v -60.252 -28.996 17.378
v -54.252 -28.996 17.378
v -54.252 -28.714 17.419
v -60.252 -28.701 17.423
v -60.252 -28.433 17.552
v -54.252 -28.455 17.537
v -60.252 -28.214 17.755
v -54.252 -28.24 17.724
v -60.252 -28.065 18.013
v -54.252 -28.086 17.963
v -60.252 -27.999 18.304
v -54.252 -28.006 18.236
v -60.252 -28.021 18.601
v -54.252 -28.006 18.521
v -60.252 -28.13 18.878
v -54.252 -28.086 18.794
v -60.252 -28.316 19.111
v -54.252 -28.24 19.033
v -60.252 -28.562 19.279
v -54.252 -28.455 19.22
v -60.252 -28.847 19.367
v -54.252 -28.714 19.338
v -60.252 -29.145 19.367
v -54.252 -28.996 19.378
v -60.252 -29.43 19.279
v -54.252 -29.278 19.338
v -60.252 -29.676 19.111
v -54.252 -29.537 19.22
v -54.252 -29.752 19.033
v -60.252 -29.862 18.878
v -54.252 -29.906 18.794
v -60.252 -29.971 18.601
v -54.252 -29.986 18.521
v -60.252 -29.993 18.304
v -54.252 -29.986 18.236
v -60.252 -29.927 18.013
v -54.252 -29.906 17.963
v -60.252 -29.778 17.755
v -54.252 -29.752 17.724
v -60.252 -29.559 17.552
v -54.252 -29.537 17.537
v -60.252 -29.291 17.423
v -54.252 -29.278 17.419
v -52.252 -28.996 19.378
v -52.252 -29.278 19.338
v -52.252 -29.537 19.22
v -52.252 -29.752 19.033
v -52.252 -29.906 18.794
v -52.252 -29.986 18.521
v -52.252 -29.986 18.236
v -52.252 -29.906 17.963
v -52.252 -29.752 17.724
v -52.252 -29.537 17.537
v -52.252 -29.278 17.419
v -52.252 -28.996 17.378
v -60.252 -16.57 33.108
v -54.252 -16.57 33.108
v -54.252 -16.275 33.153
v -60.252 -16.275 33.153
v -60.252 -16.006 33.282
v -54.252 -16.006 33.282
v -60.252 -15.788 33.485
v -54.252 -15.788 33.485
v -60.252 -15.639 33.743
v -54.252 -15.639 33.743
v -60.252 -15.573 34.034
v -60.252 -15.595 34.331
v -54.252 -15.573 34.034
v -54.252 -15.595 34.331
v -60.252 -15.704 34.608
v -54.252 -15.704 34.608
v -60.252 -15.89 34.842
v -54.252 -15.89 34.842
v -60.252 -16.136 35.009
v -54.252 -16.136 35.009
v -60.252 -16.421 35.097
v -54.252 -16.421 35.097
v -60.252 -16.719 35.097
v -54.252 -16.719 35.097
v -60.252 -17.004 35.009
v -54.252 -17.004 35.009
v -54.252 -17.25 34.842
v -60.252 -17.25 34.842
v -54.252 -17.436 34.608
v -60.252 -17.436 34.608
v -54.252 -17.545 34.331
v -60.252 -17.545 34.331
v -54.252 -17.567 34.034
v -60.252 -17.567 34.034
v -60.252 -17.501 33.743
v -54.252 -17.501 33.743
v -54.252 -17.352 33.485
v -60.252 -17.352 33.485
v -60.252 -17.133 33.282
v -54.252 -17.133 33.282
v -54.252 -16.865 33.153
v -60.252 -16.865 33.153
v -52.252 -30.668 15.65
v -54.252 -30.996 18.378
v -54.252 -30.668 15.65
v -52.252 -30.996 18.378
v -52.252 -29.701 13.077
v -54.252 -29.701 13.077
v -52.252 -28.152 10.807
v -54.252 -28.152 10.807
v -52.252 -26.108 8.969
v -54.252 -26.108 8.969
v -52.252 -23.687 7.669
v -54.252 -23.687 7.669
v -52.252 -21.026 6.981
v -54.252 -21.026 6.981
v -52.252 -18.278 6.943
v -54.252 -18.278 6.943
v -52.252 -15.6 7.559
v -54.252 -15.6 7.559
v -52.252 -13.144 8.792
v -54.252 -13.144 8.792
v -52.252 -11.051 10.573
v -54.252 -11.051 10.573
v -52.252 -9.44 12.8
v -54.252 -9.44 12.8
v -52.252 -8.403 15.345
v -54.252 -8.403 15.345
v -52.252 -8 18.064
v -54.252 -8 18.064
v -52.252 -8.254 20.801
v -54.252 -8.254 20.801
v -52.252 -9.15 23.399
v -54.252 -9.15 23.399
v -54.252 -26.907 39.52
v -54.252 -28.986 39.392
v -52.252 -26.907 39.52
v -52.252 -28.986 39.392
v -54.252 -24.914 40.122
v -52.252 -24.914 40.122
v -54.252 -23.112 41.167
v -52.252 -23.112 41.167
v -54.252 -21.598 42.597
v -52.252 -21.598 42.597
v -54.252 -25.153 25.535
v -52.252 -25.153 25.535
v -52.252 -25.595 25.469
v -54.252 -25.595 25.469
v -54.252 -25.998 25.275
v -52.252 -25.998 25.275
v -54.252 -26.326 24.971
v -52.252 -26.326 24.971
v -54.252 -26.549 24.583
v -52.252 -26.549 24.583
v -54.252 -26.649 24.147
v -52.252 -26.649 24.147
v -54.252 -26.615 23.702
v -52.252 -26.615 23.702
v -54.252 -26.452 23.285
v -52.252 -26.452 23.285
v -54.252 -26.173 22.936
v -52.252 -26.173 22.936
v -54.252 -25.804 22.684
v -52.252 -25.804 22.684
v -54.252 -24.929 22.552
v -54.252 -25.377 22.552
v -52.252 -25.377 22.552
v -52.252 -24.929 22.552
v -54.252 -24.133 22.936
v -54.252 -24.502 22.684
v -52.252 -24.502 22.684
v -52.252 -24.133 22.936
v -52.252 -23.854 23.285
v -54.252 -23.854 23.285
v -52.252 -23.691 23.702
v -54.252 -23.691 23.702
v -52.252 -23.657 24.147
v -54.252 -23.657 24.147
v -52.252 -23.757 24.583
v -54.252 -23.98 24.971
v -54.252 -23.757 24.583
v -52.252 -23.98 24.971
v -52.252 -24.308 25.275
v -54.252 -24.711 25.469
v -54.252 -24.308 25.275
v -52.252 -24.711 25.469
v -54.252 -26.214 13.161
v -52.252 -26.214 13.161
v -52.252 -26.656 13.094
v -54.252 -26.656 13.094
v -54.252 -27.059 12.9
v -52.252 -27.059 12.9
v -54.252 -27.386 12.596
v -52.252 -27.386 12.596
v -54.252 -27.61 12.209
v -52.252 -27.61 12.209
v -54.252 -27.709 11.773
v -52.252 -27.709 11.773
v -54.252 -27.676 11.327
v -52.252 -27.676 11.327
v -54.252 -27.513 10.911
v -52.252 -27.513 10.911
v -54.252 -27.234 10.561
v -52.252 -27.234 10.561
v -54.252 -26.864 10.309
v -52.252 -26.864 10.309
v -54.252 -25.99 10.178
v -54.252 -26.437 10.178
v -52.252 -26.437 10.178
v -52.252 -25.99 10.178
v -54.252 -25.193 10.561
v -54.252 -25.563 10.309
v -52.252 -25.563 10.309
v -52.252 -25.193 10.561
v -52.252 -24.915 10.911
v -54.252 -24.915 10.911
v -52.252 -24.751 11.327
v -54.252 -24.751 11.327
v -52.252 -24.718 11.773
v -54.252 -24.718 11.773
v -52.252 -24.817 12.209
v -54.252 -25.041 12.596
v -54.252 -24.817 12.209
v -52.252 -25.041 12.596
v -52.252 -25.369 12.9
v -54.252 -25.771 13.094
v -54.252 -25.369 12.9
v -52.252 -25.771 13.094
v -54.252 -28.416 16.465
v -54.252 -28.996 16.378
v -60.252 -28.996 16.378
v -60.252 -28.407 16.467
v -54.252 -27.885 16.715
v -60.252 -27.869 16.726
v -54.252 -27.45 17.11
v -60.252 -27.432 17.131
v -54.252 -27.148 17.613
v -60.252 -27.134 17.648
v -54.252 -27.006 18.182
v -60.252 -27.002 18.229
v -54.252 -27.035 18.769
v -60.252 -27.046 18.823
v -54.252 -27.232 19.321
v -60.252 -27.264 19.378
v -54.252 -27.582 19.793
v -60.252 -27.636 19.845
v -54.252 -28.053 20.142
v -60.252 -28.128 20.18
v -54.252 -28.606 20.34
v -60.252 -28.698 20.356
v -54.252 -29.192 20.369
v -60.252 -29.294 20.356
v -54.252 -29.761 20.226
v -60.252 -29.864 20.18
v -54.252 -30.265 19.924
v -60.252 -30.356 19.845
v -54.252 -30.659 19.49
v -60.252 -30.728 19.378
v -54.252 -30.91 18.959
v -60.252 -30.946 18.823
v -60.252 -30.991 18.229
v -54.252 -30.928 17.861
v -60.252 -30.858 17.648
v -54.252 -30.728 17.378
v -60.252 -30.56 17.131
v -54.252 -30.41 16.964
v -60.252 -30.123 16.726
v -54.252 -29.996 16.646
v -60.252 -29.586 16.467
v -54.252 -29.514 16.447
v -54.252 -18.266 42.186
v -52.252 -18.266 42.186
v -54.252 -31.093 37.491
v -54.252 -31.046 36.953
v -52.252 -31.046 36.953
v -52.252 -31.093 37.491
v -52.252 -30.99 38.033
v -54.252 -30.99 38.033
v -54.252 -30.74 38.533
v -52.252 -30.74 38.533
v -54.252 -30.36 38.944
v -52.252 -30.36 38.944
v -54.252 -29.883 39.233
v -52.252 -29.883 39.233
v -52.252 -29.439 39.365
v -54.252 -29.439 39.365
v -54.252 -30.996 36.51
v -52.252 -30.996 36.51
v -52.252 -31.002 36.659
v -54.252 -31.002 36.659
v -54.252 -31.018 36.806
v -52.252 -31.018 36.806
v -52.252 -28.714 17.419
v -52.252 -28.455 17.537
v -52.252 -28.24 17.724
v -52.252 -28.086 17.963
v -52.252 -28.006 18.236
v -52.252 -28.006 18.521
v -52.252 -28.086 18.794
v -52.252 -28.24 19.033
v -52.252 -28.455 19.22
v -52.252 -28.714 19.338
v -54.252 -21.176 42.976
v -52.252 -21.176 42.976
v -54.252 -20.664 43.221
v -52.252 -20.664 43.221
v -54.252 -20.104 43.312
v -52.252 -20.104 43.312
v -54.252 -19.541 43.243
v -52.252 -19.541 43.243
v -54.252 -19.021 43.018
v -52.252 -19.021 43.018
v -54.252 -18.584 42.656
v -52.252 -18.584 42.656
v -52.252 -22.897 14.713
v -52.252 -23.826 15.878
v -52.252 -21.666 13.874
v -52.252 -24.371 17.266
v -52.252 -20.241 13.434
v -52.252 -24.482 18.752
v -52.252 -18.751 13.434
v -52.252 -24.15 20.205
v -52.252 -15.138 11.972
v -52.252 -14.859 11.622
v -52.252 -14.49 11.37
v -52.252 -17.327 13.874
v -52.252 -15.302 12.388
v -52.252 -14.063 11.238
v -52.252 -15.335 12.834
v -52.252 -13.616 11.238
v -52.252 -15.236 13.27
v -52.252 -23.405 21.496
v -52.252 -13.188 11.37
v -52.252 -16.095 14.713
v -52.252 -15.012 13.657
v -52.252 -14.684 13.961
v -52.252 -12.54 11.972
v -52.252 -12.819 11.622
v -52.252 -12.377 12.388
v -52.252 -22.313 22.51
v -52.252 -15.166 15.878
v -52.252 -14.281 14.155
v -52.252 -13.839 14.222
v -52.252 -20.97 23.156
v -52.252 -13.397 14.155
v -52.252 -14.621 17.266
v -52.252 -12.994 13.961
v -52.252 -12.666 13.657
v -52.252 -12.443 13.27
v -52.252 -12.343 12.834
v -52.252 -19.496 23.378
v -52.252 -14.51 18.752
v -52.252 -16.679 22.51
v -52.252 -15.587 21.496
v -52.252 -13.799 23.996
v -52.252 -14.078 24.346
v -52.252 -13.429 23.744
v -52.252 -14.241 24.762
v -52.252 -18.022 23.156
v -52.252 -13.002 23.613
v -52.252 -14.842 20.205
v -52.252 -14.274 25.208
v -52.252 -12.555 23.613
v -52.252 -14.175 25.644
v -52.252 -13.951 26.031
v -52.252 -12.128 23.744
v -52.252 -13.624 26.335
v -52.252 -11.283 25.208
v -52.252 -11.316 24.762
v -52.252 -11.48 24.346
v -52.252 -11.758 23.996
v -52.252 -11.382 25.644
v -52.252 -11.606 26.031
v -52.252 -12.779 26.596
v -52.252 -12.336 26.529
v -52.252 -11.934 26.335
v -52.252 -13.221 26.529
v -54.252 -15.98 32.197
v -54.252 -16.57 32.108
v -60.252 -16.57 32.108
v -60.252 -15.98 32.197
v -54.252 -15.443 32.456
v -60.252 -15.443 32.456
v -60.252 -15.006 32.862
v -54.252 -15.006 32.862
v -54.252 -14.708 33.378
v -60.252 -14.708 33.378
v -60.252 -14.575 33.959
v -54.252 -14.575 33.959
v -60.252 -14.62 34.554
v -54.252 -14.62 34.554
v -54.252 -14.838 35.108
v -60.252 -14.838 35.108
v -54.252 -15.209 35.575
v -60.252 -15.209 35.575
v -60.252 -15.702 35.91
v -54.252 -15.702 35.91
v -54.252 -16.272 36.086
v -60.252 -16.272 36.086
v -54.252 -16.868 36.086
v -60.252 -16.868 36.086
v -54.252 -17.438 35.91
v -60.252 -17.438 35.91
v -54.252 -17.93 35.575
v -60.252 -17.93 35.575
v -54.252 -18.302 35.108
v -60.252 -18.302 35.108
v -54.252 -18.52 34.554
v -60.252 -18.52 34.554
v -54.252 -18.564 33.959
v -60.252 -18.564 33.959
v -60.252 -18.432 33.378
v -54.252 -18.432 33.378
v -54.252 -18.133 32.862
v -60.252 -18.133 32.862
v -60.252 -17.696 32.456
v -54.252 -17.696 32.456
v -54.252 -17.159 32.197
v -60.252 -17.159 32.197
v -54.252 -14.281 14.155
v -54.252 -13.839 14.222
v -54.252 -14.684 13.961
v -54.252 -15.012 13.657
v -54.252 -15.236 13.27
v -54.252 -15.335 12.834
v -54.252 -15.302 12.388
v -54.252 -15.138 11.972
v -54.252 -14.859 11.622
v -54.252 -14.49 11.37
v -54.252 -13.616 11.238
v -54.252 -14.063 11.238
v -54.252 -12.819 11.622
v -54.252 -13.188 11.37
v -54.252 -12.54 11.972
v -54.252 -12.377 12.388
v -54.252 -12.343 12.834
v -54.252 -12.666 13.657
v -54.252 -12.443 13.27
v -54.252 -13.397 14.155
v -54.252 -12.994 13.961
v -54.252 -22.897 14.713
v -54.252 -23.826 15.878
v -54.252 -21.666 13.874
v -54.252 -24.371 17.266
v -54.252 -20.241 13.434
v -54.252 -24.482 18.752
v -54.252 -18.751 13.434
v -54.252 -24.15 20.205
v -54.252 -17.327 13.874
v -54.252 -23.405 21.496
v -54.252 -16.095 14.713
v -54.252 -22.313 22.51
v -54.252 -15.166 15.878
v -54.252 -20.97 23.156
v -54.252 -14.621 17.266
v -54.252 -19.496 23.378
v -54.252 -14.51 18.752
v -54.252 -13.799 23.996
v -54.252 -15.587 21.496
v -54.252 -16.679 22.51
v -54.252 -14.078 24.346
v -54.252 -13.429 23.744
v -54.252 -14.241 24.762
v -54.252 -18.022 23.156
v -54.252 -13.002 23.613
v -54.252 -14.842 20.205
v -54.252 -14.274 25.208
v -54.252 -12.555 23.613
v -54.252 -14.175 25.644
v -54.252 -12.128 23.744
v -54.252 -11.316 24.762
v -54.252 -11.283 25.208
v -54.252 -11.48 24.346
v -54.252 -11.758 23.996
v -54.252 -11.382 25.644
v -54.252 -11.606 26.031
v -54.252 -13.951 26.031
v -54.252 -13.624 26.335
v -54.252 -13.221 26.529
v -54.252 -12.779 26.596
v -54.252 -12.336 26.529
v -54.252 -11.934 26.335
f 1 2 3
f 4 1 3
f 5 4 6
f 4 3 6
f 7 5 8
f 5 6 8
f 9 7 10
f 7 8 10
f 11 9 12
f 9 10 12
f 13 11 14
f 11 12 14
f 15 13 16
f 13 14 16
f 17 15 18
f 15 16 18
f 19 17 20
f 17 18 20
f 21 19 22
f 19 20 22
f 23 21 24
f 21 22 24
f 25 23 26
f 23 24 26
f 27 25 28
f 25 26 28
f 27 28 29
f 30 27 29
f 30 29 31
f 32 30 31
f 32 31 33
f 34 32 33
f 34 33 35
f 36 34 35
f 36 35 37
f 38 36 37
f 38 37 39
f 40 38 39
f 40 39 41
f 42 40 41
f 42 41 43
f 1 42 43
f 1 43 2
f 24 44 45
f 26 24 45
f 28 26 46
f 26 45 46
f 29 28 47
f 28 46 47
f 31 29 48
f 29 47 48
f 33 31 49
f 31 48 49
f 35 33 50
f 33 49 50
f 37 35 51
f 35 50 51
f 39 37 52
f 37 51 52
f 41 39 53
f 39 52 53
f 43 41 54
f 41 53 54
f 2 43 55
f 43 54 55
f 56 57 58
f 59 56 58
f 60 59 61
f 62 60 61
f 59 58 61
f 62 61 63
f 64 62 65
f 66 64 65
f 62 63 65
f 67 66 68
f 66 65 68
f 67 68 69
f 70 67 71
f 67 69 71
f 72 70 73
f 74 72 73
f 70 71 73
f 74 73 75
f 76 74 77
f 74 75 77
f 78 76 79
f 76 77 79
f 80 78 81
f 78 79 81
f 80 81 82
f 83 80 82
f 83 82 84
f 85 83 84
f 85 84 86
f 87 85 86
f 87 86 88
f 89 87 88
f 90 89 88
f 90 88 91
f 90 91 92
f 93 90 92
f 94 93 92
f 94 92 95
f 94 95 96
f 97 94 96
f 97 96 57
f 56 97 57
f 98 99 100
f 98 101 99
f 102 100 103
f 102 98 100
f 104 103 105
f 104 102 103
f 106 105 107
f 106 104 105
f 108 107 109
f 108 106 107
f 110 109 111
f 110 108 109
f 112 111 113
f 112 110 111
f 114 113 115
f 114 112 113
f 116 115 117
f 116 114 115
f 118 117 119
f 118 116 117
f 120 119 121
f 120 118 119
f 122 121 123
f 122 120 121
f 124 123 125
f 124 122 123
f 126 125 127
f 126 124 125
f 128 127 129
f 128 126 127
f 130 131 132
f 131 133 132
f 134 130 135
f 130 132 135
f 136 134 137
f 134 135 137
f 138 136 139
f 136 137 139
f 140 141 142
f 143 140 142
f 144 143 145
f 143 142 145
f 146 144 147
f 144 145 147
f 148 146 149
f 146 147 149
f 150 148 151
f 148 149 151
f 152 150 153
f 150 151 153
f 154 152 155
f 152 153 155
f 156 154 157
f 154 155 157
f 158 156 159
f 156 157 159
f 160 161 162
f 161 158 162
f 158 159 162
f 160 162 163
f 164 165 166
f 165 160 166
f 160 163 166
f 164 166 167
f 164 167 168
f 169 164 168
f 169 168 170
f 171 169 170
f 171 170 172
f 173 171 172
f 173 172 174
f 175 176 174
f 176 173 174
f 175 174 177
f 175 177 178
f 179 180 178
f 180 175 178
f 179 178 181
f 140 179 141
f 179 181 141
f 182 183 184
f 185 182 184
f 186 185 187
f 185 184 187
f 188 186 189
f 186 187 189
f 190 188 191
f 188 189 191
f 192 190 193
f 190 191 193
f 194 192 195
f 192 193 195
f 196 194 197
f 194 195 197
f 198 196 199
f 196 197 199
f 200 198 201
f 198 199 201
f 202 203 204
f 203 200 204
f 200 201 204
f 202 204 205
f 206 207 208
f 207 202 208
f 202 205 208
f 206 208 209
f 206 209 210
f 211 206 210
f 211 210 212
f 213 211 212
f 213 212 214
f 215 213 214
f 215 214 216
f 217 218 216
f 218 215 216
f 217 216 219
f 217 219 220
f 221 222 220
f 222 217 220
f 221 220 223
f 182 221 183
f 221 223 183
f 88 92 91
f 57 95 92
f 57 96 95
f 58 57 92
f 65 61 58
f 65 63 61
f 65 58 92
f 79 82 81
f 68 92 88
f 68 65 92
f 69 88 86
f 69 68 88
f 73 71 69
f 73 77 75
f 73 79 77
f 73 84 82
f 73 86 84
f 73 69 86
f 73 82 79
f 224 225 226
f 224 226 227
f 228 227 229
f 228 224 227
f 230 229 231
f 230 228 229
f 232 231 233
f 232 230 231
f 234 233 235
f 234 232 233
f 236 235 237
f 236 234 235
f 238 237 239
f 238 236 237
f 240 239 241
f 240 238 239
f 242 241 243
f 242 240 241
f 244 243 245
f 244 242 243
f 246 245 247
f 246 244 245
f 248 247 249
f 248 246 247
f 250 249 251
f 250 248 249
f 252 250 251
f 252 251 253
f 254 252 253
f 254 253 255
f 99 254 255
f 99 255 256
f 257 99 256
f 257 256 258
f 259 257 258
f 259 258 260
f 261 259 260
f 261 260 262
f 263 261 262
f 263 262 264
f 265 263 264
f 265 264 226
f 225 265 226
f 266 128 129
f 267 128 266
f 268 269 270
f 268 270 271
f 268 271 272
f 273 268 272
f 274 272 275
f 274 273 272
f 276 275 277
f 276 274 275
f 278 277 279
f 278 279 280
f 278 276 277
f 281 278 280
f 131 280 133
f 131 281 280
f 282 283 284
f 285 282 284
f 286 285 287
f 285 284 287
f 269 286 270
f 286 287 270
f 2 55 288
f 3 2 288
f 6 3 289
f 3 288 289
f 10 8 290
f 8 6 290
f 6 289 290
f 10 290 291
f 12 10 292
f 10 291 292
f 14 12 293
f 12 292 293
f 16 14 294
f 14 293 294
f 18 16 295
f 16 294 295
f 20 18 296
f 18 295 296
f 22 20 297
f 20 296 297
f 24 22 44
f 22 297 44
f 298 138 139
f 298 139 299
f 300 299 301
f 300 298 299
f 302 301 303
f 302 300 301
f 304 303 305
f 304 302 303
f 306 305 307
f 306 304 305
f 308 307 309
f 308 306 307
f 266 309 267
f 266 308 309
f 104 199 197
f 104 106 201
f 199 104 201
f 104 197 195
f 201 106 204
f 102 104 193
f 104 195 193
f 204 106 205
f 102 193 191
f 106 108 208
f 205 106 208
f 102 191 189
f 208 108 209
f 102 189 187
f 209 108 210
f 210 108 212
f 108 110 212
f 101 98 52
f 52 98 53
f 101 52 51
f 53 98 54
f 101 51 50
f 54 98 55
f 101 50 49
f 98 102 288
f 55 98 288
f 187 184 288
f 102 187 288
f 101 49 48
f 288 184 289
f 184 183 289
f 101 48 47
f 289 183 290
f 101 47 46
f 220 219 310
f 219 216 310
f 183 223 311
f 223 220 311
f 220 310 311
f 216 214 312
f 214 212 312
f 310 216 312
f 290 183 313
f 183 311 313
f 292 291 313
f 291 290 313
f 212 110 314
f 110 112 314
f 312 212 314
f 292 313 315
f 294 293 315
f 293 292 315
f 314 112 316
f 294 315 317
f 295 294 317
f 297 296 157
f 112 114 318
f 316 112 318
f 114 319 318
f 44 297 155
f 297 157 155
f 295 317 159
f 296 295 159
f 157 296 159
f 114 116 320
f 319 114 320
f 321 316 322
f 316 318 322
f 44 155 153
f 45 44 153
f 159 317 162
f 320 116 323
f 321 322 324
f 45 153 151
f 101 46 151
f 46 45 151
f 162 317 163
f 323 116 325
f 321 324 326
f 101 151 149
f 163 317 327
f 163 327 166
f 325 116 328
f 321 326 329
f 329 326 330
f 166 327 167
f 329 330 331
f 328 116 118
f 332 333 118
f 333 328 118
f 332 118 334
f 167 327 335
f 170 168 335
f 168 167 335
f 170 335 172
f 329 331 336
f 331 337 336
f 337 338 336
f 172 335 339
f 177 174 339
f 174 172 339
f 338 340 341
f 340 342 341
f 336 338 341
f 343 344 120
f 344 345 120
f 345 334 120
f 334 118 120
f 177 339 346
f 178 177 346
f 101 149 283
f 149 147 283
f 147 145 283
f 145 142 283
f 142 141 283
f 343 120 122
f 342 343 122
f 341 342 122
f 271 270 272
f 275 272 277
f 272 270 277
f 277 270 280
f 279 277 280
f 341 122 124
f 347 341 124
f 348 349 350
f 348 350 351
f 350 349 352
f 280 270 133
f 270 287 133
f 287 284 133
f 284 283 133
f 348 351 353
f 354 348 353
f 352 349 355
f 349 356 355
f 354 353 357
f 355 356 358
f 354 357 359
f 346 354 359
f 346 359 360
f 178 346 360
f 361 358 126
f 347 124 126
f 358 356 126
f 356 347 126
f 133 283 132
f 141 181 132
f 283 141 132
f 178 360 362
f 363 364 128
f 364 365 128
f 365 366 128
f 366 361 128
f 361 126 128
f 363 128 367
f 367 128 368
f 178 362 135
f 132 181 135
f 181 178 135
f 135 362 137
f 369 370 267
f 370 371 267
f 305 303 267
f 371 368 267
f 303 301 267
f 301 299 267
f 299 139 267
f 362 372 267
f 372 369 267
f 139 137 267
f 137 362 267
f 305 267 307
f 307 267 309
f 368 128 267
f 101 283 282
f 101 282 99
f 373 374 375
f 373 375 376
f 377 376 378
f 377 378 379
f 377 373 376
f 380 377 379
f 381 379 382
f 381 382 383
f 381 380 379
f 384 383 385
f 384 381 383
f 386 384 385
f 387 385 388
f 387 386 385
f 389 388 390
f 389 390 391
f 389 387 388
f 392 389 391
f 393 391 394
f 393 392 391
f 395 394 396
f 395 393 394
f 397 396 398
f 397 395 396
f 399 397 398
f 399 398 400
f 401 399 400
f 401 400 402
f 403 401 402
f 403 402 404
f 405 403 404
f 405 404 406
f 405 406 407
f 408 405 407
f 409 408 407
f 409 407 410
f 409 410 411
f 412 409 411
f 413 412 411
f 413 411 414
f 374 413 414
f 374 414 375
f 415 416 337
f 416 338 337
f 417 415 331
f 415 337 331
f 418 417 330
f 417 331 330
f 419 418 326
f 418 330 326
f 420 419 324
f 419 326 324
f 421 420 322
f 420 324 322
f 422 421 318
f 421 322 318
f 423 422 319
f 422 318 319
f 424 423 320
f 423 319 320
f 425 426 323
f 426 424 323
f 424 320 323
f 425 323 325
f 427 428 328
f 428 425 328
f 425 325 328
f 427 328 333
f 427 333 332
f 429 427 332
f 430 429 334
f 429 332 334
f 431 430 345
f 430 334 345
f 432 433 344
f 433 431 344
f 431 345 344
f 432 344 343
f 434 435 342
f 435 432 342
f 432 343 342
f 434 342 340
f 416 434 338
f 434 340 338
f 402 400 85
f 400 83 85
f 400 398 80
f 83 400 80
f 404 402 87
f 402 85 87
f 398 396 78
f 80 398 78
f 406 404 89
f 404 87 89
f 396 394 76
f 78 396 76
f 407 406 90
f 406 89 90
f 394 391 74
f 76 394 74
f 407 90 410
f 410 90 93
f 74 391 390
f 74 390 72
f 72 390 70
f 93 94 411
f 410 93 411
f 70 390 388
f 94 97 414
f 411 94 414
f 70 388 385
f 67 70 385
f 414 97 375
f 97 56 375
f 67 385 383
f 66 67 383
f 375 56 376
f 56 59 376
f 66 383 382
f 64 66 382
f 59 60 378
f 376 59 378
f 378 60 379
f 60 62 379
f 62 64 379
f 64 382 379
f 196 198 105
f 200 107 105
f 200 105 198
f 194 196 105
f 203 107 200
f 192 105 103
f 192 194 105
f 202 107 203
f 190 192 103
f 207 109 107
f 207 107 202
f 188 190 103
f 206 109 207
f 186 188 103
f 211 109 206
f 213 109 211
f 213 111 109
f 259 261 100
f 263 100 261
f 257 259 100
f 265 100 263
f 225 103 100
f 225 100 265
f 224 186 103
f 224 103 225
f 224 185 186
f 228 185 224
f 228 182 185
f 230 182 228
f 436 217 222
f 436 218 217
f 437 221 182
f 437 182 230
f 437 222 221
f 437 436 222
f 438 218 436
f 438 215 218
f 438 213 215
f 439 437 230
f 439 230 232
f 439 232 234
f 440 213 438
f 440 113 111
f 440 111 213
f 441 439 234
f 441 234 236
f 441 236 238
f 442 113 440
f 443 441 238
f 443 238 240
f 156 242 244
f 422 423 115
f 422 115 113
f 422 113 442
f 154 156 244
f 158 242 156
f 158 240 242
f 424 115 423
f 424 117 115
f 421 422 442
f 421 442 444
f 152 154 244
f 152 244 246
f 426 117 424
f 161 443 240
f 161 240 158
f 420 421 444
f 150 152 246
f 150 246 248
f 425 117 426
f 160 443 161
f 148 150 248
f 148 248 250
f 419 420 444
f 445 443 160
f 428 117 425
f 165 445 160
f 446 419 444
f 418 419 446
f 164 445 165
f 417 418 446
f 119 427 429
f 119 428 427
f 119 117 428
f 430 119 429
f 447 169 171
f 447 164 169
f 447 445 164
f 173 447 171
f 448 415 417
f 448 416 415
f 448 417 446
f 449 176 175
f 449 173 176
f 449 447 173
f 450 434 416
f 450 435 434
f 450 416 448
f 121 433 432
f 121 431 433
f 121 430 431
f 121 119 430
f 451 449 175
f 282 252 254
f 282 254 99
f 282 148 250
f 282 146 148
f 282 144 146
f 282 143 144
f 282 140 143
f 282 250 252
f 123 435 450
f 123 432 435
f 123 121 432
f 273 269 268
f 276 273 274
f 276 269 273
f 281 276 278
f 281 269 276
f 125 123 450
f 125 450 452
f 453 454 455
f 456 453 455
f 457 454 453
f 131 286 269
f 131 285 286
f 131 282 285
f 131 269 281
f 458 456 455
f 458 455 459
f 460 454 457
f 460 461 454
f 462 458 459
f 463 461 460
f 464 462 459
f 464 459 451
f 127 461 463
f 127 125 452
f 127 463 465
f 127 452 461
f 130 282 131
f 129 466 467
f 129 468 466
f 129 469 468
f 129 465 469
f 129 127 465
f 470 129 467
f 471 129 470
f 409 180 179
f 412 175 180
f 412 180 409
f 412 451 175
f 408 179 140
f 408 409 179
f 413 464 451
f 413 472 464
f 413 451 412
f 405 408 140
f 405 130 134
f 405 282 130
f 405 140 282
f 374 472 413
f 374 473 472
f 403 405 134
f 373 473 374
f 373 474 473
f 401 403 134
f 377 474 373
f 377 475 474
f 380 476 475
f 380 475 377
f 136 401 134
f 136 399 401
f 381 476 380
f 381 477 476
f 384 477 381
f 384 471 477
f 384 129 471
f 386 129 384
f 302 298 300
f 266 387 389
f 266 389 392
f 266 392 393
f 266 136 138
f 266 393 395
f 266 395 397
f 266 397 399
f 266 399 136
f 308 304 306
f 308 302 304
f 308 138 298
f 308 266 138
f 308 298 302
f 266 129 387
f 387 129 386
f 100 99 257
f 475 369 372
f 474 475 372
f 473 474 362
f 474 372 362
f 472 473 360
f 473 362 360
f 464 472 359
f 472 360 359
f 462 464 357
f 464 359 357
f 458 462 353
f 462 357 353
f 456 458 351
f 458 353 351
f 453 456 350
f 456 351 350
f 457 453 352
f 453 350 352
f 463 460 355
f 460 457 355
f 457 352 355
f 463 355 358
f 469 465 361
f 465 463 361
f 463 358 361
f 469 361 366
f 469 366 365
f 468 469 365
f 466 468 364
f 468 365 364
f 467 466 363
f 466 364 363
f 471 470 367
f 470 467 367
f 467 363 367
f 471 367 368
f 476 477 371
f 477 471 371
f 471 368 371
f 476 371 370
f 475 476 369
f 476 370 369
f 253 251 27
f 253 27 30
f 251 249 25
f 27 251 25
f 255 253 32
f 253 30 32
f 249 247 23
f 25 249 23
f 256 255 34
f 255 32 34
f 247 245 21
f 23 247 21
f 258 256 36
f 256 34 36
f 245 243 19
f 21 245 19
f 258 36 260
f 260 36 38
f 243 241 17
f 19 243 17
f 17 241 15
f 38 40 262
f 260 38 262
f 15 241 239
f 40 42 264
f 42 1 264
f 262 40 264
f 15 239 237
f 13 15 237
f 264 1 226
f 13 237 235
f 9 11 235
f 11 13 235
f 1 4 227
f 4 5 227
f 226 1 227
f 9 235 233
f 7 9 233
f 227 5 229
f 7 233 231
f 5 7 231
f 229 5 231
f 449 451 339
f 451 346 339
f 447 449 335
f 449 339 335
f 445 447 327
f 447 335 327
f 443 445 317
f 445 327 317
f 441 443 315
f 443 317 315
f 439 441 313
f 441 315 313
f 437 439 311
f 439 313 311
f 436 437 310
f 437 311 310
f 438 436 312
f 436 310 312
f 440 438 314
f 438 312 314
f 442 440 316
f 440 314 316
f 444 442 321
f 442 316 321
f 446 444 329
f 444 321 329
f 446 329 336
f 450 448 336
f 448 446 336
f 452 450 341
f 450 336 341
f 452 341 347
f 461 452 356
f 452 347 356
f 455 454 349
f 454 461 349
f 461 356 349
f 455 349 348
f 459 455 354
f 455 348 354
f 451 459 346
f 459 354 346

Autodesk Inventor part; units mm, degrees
ref_plane "YZ Plane" through (0, 0, 0) normal (1, 0, 0) x (0, 1, 0)
ref_plane "XZ Plane" through (0, 0, 0) normal (0, 1, 0) x (-1, 0, 0)
ref_plane "XY Plane" through (0, 0, 0) normal (0, 0, 1) x (1, 0, 0)
ref_plane "作業平面1" through (-52.2521, -19.4961, 18.3784) normal (-1, 0, 0) x (0, 0, 1)
sketch "スケッチ1" plane through (-52.2521, -19.4961, 18.3784) normal (-1, 0, 0) x (0, 0, 1)
  line L0 (27.6413, -15.0569) -> (18.8577, -11.6363) projected
  arc A0 (27.6413, -15.0569) -> (32.8377, -3.1521) centre (30, -9) ccw projected
  line L1 (5.0205, 10.3462) -> (32.8377, -3.1521) projected
  arc A1 (5.0205, 10.3462) -> (0, -11.5) centre (0, 0) ccw projected
  line L2 (18.1319, -11.5) -> (0, -11.5) projected
  arc A2 (18.8577, -11.6363) -> (18.1319, -11.5) centre (18.1319, -13.5) ccw projected
  circle A3 centre (0, 0) radius 1.75 projected
  circle A4 centre (30, -9) radius 3.6 projected
  arc A5 (27.2373, -0.4345) -> (21.8406, -12.798) centre (30, -9) ccw
  circle A6 centre (6.7175, 6.7175) radius 1.6 projected
  circle A7 centre (-5.6569, 5.6569) radius 1.6 projected
  circle A8 centre (-6.7175, -6.7175) radius 1.6 projected
  circle A9 centre (5.6569, -5.6569) radius 1.6 projected
  circle A10 centre (15.7301, 2.9263) radius 2
  circle A11 centre (-5.6569, 5.6569) radius 1.5
  circle A12 centre (6.7175, 6.7175) radius 1.5
  circle A13 centre (5.6569, -5.6569) radius 1.5
  circle A14 centre (-6.7175, -6.7175) radius 1.5
  circle A15 centre (0, 0) radius 5
  circle A16 centre (0, -9.5) radius 1
  circle A17 centre (0, -9.5) radius 2
  line L3 (0, 0) -> (0, -11.5) construction
  circle A18 centre (15.7301, 2.9263) radius 1 projected
  circle A19 centre (0, -9.5) radius 1 projected
  point P0 (-18.3784, 19.4961)
  dimension "d0" = 9
  dimension "d4" = 4
  dimension "d8" = 3
  dimension "d9" = 10
  dimension "d10" = 4
  dimension "d11" = 2
extrude "押し出し1" add sketch "スケッチ1" along normal blind 2 contours A10 | A17 | L0 A2 L2 A1 L1 A5 | A6 | A7 | A8 | A9 | A18
fillet "フィレット1" radius 2 2 edges at (-53.2521, -19.9306, 45.6157) (-53.2521, -32.2941, 40.2191)
sketch "スケッチ2" plane through (-52.2521, -19.4961, 18.3784) normal (1, 0, 0) x (0, 0, -1)
  circle A0 centre (-15.7301, 2.9263) radius 2
  circle A1 centre (-15.7301, 2.9263) radius 1 projected
  circle A2 centre (0, -9.5) radius 1 projected
  circle A3 centre (0, -9.5) radius 2
  point P0 (18.3784, 19.4961)
  dimension "d5" = 4
extrude "押し出し2" add sketch "スケッチ2" against normal blind 8
properties part number "Motor_Cover"
